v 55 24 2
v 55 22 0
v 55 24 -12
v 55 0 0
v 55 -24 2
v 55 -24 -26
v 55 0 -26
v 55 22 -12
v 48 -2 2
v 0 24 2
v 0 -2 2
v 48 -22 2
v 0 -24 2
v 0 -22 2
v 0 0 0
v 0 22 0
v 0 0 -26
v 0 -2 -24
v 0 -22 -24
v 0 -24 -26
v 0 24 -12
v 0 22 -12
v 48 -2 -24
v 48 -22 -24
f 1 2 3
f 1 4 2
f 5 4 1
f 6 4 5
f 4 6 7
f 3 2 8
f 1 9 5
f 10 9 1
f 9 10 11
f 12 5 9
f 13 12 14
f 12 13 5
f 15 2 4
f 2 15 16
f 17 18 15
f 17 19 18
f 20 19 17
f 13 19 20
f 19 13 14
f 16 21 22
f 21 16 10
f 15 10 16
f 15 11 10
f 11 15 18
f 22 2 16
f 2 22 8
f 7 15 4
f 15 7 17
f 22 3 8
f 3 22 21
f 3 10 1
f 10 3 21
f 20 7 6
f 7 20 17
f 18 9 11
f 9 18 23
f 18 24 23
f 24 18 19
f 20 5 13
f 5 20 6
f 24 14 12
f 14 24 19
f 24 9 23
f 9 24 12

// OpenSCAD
monitor_width = 22;
monitor_height = 12;
MG996R_full_width = 55;
MG996R_full_depth = 20;
MG996R_screw_width = 7;
MG996R_screw_depth = 18;
MG996R_screw_height = 28;
screw_hole_diameter = 1;
screw_hole_height = 12;



thickness = 2;

// over monitor
cube([MG996R_full_width,
    monitor_width,
    thickness]);

// front of monitor
translate ([0,
    monitor_width,
    -monitor_height])
cube([MG996R_full_width,
    thickness,
    monitor_height + thickness]);

// back of monitor
translate ([0,
    -thickness,
    -MG996R_screw_height + thickness])
cube([MG996R_full_width,
    thickness,
    MG996R_screw_height]);

// MG996R floor
translate([0,
    -(MG996R_full_depth + 2 * thickness),
    -MG996R_screw_height + thickness])
cube([MG996R_full_width,
    MG996R_full_depth + 2 * thickness,
    thickness]);

// MG996R back
translate ([0,
    -(MG996R_full_depth + 2 * thickness),
    -MG996R_screw_height + thickness])
cube([MG996R_full_width,
    thickness,
    MG996R_screw_height]);

// MG996R right
translate ([0,
    -(MG996R_full_depth + 2 * thickness),
    -MG996R_screw_height + thickness])
difference(
    cube([MG996R_screw_width,
        MG996R_full_depth + thickness,
        MG996R_screw_height]
    ),
    union(
        cylinder(screw_hole_height, d=screw_hole_diameter),
        cylinder(screw_hole_height, d=screw_hole_diameter)
    )
);
    
// MG996R left
translate ([MG996R_full_width - MG996R_screw_width,
    -(MG996R_full_depth + 2 * thickness),
    -MG996R_screw_height + thickness])
cube([MG996R_screw_width,
    MG996R_full_depth + thickness,
    MG996R_screw_height]);
